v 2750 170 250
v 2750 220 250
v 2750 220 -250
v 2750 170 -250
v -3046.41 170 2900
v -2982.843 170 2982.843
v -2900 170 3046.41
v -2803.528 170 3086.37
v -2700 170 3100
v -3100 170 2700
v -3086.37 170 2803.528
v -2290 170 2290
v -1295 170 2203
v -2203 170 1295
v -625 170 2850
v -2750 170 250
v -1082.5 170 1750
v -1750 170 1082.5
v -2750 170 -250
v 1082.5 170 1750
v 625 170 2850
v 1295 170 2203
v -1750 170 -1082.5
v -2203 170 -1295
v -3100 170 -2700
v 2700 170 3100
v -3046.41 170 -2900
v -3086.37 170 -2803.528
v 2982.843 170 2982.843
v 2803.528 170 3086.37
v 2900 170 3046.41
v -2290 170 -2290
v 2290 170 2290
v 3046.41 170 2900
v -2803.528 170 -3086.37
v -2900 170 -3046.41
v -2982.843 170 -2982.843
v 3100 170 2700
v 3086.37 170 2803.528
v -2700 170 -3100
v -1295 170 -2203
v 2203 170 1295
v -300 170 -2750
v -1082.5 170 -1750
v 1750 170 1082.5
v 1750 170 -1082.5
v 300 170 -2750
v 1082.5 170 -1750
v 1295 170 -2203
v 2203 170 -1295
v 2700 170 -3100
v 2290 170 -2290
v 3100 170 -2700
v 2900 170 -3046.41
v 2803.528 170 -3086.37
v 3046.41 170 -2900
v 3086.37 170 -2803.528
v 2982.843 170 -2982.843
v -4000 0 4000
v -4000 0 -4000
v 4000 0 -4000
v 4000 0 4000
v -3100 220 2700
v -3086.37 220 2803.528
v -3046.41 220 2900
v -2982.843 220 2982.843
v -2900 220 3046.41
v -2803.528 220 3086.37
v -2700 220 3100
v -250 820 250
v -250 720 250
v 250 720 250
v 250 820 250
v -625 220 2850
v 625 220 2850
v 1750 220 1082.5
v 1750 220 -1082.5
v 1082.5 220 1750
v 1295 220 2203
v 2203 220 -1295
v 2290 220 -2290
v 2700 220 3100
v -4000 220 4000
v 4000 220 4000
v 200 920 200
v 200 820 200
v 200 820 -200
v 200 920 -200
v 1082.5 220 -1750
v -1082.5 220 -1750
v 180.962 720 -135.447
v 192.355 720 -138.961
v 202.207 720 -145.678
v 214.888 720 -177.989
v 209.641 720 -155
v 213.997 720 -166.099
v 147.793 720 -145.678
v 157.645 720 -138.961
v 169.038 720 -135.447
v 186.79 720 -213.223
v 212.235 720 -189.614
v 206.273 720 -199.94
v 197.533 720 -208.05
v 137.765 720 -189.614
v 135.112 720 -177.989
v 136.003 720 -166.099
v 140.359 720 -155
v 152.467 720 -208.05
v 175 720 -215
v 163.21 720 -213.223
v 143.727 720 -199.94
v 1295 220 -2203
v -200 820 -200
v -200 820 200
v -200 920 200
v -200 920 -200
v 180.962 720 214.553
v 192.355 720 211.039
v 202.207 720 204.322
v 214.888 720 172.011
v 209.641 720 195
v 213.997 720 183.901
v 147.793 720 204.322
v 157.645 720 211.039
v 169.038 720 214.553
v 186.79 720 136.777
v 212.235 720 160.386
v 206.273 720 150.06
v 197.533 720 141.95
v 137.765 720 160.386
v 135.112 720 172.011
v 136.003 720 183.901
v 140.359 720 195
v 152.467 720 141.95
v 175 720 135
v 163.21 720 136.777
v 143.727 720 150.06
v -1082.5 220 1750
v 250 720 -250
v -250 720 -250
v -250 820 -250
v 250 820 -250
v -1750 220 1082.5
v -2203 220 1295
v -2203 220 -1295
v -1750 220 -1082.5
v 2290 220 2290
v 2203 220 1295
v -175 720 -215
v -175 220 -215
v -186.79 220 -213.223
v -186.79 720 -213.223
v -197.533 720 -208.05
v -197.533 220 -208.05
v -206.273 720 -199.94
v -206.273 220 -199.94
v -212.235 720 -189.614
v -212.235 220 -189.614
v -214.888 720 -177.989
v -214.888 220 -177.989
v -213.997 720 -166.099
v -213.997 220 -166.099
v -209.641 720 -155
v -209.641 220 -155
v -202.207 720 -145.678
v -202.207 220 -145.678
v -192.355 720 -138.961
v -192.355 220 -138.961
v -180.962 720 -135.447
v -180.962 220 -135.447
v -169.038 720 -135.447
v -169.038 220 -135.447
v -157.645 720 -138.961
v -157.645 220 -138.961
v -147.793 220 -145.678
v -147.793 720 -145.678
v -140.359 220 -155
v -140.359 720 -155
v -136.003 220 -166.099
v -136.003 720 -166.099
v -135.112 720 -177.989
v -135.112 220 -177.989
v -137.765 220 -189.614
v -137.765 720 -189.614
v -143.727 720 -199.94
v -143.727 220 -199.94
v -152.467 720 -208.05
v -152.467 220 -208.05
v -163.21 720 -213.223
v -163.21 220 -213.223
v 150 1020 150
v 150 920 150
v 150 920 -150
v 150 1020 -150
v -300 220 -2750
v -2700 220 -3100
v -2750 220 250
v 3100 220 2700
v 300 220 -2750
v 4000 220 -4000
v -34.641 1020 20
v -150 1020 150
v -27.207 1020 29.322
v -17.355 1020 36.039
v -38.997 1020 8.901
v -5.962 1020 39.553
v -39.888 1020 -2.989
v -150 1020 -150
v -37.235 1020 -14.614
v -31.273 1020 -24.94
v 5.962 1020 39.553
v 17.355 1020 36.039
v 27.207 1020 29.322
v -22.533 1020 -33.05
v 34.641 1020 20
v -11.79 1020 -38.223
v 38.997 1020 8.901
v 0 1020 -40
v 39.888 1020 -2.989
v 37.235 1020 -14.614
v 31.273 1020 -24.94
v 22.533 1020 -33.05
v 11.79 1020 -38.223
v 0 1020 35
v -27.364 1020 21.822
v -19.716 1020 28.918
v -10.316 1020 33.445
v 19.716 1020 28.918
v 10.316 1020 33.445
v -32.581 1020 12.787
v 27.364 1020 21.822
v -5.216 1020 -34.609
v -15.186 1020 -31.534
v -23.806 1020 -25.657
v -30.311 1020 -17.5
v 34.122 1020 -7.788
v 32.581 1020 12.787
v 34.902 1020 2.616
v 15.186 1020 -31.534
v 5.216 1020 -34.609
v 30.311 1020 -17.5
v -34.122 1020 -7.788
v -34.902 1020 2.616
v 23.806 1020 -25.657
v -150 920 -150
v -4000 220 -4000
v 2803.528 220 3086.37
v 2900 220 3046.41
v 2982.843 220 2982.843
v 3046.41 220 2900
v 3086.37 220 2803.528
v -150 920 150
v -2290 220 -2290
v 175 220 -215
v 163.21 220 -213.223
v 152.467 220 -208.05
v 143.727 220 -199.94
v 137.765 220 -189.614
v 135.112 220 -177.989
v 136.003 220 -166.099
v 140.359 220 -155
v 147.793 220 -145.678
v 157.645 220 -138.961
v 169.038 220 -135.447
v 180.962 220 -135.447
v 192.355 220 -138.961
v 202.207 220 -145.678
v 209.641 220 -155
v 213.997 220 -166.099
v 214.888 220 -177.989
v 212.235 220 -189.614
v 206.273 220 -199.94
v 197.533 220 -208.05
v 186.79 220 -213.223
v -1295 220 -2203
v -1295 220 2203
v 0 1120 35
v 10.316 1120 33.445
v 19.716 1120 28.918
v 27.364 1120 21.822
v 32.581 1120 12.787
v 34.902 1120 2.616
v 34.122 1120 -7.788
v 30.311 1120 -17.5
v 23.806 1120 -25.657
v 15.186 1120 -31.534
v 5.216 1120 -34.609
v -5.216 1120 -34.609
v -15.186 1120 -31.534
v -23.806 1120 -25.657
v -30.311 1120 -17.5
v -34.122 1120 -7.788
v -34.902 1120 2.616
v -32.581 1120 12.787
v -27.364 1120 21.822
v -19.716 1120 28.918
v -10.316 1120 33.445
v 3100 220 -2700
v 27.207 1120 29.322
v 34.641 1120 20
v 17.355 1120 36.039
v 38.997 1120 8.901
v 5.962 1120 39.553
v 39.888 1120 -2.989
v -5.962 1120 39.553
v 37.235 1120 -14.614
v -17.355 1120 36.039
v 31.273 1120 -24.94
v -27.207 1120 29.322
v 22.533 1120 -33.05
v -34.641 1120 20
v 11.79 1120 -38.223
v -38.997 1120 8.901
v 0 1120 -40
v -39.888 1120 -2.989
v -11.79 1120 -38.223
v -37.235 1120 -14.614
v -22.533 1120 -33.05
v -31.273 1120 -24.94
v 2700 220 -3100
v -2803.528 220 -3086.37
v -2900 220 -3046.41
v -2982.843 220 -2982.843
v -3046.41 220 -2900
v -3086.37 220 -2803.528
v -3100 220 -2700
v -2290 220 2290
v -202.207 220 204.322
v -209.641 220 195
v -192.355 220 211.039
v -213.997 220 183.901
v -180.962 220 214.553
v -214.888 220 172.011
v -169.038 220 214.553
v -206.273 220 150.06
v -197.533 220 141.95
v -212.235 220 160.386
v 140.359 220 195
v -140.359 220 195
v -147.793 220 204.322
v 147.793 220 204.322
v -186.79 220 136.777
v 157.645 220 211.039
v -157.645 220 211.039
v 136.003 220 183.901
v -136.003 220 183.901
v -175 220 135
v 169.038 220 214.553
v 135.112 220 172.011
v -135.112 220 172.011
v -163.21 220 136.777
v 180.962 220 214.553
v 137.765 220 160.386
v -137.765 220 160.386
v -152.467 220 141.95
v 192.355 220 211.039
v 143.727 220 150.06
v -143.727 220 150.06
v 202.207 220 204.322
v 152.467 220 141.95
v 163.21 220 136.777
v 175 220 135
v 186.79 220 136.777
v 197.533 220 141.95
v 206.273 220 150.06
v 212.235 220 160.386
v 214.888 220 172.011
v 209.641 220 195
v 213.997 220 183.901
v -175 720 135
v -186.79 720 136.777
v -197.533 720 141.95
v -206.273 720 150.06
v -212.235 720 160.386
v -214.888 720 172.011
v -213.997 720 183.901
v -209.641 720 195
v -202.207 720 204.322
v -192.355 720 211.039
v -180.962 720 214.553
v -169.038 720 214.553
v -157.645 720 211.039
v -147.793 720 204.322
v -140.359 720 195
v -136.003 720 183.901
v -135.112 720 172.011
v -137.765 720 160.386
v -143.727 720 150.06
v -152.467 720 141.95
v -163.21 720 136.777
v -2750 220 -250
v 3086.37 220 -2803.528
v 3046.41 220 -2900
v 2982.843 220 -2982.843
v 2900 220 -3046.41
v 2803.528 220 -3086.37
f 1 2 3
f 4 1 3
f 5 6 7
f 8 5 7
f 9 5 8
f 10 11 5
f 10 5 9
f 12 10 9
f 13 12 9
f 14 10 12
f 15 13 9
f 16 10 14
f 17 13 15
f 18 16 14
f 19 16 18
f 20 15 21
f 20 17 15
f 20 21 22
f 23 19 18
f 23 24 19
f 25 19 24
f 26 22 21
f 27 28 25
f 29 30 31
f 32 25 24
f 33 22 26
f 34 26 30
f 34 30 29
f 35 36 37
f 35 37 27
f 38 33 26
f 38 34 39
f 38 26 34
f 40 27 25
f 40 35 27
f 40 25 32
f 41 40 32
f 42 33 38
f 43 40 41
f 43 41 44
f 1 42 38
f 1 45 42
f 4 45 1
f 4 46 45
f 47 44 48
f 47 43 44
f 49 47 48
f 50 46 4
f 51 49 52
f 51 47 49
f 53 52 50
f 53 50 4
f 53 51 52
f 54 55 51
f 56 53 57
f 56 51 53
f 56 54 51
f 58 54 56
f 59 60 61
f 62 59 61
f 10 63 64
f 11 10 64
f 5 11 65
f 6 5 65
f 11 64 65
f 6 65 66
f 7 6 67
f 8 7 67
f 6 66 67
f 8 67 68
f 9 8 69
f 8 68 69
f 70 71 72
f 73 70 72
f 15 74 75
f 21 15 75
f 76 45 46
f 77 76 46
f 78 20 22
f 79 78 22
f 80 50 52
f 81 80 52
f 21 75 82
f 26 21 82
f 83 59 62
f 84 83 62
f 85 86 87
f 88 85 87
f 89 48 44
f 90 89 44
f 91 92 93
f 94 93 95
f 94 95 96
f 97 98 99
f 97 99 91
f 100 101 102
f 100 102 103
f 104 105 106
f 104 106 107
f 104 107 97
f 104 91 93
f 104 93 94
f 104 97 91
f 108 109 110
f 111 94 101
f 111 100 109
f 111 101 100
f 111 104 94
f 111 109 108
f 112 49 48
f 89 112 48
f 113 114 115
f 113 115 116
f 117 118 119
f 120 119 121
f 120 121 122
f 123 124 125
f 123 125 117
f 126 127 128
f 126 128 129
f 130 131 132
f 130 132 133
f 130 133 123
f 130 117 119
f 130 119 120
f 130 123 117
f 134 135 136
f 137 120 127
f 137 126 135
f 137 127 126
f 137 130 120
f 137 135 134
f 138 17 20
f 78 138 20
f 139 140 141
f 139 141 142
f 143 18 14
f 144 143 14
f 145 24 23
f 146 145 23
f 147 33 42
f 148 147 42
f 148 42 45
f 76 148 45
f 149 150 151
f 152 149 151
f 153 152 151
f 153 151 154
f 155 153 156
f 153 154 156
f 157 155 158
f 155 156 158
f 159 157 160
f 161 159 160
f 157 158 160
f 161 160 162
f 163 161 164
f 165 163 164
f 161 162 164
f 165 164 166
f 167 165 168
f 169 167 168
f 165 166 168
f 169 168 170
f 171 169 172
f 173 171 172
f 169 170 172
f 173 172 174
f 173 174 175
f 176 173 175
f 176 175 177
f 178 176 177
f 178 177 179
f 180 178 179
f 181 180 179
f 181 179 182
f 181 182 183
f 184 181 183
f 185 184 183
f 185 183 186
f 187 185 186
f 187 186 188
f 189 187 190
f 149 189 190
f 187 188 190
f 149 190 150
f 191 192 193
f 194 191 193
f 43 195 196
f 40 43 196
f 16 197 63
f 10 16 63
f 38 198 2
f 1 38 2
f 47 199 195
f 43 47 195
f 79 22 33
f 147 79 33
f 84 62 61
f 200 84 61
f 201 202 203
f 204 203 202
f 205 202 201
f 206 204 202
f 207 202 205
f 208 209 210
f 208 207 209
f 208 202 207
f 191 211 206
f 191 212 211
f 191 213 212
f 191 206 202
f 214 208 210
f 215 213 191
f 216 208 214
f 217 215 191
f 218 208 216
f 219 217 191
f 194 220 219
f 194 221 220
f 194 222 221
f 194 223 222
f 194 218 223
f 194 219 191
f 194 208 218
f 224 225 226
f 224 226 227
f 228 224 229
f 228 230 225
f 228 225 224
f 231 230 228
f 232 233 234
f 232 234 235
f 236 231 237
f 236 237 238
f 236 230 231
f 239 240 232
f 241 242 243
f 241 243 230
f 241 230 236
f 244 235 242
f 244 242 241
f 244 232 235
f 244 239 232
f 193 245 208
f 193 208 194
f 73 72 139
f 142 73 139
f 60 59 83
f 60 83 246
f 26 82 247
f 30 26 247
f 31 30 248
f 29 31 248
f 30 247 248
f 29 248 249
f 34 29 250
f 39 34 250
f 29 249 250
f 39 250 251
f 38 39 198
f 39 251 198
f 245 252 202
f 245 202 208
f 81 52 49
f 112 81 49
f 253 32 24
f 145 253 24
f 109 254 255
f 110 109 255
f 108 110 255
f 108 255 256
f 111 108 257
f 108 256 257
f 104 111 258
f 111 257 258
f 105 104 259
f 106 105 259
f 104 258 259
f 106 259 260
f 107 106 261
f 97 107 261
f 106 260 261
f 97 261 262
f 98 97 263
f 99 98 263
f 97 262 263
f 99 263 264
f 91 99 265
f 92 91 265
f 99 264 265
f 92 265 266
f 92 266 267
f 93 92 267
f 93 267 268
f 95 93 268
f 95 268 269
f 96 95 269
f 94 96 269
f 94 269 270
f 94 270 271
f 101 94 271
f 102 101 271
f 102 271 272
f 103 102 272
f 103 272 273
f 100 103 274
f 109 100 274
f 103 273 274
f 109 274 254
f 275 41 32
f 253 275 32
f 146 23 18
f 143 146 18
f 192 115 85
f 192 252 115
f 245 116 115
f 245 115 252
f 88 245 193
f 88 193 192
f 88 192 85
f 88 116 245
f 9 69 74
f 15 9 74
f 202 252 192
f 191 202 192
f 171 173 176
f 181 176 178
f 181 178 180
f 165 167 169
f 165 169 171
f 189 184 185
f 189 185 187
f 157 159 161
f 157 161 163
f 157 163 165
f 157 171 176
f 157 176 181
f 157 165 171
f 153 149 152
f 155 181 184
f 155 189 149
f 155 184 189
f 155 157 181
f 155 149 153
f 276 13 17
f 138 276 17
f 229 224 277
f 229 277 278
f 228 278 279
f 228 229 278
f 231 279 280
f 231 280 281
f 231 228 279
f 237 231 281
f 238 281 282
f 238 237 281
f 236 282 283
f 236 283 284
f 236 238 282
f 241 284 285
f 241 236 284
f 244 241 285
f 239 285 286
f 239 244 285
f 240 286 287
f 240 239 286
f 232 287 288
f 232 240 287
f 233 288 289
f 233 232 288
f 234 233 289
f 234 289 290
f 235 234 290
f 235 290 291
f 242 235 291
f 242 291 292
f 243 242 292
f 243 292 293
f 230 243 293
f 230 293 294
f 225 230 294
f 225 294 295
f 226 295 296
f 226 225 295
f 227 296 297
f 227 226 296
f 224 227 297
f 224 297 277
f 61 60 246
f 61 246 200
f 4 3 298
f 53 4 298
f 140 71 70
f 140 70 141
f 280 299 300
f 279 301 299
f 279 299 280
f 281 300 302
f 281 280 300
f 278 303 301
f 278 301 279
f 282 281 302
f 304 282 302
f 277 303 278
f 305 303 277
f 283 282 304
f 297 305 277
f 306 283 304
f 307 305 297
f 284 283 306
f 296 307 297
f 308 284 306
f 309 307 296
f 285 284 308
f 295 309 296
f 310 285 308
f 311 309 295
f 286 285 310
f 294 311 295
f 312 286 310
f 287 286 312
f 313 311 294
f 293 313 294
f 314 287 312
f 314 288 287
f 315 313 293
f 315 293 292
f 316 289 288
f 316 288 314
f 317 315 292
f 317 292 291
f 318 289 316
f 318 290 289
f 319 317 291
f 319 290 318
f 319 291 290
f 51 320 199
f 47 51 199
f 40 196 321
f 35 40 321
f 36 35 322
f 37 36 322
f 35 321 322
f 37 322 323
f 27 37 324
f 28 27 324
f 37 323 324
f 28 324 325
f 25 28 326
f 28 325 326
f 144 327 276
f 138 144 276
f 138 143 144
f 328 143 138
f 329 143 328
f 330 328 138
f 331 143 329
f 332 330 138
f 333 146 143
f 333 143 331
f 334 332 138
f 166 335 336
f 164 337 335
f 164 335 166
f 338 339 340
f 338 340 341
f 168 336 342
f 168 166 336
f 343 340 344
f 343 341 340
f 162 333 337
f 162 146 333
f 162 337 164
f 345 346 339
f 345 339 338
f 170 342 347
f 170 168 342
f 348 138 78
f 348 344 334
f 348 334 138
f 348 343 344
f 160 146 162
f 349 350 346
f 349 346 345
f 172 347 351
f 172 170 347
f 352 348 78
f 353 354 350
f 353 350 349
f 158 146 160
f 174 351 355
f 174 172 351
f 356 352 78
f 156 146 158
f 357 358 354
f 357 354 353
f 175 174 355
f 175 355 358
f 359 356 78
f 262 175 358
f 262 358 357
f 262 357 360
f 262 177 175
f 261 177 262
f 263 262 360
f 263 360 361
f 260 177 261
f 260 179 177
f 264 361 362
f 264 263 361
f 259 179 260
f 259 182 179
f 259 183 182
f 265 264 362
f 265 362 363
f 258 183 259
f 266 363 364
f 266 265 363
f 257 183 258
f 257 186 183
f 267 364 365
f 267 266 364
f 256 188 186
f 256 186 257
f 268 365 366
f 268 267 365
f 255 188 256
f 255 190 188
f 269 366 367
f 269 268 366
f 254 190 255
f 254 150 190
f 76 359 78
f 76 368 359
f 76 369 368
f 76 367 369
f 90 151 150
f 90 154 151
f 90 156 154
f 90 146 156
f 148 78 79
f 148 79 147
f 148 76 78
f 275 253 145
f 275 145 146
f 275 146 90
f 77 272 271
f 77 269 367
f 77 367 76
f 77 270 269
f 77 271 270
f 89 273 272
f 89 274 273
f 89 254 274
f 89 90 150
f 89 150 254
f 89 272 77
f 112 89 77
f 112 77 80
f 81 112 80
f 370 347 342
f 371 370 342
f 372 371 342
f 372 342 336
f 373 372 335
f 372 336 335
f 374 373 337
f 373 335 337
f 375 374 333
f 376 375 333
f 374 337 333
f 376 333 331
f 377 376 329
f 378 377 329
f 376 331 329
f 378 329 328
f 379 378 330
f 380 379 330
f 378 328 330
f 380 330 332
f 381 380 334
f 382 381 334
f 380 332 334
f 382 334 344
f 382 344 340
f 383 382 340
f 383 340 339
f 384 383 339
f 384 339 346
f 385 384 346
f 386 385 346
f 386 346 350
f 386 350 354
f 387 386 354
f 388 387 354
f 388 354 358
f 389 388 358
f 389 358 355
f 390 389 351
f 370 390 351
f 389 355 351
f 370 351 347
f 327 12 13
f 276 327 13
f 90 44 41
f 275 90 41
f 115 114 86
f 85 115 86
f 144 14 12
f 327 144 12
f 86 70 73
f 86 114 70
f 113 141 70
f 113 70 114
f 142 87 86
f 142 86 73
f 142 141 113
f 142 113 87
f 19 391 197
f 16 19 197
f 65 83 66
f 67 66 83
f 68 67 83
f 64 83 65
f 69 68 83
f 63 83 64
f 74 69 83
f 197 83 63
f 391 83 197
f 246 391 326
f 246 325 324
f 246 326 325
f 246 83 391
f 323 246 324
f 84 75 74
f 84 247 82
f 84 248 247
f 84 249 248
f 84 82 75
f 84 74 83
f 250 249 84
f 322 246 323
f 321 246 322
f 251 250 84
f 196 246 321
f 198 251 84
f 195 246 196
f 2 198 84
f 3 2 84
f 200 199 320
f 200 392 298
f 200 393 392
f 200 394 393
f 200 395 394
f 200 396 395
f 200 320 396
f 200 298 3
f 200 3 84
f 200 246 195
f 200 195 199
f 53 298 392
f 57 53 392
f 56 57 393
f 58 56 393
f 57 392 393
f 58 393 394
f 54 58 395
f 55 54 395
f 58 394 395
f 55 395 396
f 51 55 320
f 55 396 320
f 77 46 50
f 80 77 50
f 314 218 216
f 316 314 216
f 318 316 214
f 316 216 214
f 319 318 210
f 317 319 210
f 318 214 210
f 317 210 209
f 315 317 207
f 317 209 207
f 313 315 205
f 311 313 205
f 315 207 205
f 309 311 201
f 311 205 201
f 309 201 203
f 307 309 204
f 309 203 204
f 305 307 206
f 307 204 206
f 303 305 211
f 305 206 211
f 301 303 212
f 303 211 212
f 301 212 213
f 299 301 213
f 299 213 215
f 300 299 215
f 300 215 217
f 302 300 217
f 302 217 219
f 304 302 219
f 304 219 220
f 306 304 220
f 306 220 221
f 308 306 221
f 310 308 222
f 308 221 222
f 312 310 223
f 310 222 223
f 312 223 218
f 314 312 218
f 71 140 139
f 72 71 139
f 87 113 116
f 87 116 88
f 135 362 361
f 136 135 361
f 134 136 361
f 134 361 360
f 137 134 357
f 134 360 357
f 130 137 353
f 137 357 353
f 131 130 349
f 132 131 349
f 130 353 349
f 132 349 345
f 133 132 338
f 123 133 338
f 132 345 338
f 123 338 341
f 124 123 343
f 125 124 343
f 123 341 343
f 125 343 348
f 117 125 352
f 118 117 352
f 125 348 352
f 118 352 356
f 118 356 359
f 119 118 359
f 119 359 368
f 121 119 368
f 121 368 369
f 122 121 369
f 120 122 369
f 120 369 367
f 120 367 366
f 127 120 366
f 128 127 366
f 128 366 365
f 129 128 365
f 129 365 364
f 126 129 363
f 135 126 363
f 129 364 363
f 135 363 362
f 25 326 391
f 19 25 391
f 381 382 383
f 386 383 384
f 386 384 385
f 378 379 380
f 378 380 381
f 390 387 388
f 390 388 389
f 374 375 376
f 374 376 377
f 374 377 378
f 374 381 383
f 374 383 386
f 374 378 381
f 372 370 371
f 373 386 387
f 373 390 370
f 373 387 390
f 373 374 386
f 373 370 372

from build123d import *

# Parameters (mm, degrees)
SKETCH1_W           = 8000
SKETCH1_H           = 8000
GROUND_FLOOR_DEPTH  = 220
MOAT_DEPTH          = 50
CITADEL_DEPTH       = 50
SKETCH6_R           = 40
BOSS_EXTRUDE1_DEPTH = 500
SKETCH7_W           = 500
SKETCH7_H           = 500
BOSS_EXTRUDE2_DEPTH = 100
SKETCH8_W           = 400
SKETCH8_H           = 400
BOSS_EXTRUDE3_DEPTH = 100
SKETCH9_W           = 300
SKETCH9_H           = 300
BOSS_EXTRUDE4_DEPTH = 100
SKETCH10_R          = 40
SKETCH10_R_2        = 35
BOSS_EXTRUDE5_DEPTH = 100


with BuildPart() as part:
    # Sketch1 → Ground Floor (new body)
    with BuildSketch(Plane(origin=(0, 0, 0), x_dir=(1, 0, 0), z_dir=(0, 1, 0))):
        Rectangle(SKETCH1_W, SKETCH1_H)
    extrude(amount=GROUND_FLOOR_DEPTH)

    # Sketch2 → Moat (cut)
    with BuildSketch(Plane(origin=(0, 220, 0), x_dir=(1, 0, 0), z_dir=(0, 1, 0))):
        with BuildLine():
            Line((-625, -2850), (625, -2850))
            Line((625, -2850), (2700, -3100))
            ThreePointArc((2700, -3100), (2982.842712475, -2982.842712475), (3100, -2700))
            Line((3100, -2700), (2750, -250))
            Line((2750, -250), (2750, 250))
            Line((2750, 250), (3100, 2700))
            ThreePointArc((3100, 2700), (2982.842712475, 2982.842712475), (2700, 3100))
            Line((2700, 3100), (300, 2750))
            Line((300, 2750), (-300, 2750))
            Line((-300, 2750), (-2700, 3100))
            ThreePointArc((-2700, 3100), (-2982.842712475, 2982.842712475), (-3100, 2700))
            Line((-3100, 2700), (-2750, 250))
            Line((-2750, 250), (-2750, -250))
            Line((-2750, -250), (-3100, -2700))
            ThreePointArc((-3100, -2700), (-2982.842712475, -2982.842712475), (-2700, -3100))
            Line((-2700, -3100), (-625, -2850))
        make_face()
    extrude(amount=-MOAT_DEPTH, mode=Mode.SUBTRACT)

    # Sketch3 → Citadel (add)
    with BuildSketch(Plane(origin=(0, 170, 0), x_dir=(1, 0, 0), z_dir=(0, 1, 0))):
        Polygon((-2290, -2290), (-1295, -2203), (-1082.5, -1750), (0, -1750), (1082.5, -1750), (1295, -2203), (2290, -2290), (2203, -1295), (1750, -1082.5), (1750, 0), (1750, 1082.5), (2203, 1295), (2290, 2290), (1295, 2203), (1082.5, 1750), (0, 1750), (-1082.5, 1750), (-1295, 2203), (-2290, 2290), (-2203, 1295), (-1750, 1082.5), (-1750, 0), (-1750, -1082.5), (-2203, -1295), align=None)
    extrude(amount=CITADEL_DEPTH)

    # Sketch6 → Boss-Extrude1 (add)
    with BuildSketch(Plane(origin=(0, 220, 0), x_dir=(1, 0, 0), z_dir=(0, 1, 0))):
        with Locations(Location((-175, -175, 0), (0, 0, 90))):
            Circle(SKETCH6_R)
        with Locations(Location((-175, 175, 0), (0, 0, 90))):
            Circle(SKETCH6_R)
        with Locations(Location((175, 175, 0), (0, 0, 90))):
            Circle(SKETCH6_R)
        with Locations(Location((175, -175, 0), (0, 0, 90))):
            Circle(SKETCH6_R)
    extrude(amount=BOSS_EXTRUDE1_DEPTH)


with BuildPart() as body_2:
    # Sketch7 → Boss-Extrude2 (new body)
    with BuildSketch(Plane(origin=(0, 720, 0), x_dir=(1, 0, 0), z_dir=(0, 1, 0))):
        Rectangle(SKETCH7_W, SKETCH7_H)
    extrude(amount=BOSS_EXTRUDE2_DEPTH)

    # Sketch8 → Boss-Extrude3 (add)
    with BuildSketch(Plane(origin=(0, 820, 0), x_dir=(1, 0, 0), z_dir=(0, 1, 0))):
        Rectangle(SKETCH8_W, SKETCH8_H)
    extrude(amount=BOSS_EXTRUDE3_DEPTH)

    # Sketch9 → Boss-Extrude4 (add)
    with BuildSketch(Plane(origin=(0, 920, 0), x_dir=(1, 0, 0), z_dir=(0, 1, 0))):
        Rectangle(SKETCH9_W, SKETCH9_H)
    extrude(amount=BOSS_EXTRUDE4_DEPTH)

    # Sketch10 → Boss-Extrude5 (add)
    with BuildSketch(Plane(origin=(0, 1020, 0), x_dir=(1, 0, 0), z_dir=(0, 1, 0))):
        with Locations(Location((0, 0, 0), (0, 0, 90))):
            Circle(SKETCH10_R)
        with Locations(Location((0, 0, 0), (0, 0, 270))):
            Circle(SKETCH10_R_2, mode=Mode.SUBTRACT)
    extrude(amount=BOSS_EXTRUDE5_DEPTH)


solid = Compound([part.part, body_2.part])
